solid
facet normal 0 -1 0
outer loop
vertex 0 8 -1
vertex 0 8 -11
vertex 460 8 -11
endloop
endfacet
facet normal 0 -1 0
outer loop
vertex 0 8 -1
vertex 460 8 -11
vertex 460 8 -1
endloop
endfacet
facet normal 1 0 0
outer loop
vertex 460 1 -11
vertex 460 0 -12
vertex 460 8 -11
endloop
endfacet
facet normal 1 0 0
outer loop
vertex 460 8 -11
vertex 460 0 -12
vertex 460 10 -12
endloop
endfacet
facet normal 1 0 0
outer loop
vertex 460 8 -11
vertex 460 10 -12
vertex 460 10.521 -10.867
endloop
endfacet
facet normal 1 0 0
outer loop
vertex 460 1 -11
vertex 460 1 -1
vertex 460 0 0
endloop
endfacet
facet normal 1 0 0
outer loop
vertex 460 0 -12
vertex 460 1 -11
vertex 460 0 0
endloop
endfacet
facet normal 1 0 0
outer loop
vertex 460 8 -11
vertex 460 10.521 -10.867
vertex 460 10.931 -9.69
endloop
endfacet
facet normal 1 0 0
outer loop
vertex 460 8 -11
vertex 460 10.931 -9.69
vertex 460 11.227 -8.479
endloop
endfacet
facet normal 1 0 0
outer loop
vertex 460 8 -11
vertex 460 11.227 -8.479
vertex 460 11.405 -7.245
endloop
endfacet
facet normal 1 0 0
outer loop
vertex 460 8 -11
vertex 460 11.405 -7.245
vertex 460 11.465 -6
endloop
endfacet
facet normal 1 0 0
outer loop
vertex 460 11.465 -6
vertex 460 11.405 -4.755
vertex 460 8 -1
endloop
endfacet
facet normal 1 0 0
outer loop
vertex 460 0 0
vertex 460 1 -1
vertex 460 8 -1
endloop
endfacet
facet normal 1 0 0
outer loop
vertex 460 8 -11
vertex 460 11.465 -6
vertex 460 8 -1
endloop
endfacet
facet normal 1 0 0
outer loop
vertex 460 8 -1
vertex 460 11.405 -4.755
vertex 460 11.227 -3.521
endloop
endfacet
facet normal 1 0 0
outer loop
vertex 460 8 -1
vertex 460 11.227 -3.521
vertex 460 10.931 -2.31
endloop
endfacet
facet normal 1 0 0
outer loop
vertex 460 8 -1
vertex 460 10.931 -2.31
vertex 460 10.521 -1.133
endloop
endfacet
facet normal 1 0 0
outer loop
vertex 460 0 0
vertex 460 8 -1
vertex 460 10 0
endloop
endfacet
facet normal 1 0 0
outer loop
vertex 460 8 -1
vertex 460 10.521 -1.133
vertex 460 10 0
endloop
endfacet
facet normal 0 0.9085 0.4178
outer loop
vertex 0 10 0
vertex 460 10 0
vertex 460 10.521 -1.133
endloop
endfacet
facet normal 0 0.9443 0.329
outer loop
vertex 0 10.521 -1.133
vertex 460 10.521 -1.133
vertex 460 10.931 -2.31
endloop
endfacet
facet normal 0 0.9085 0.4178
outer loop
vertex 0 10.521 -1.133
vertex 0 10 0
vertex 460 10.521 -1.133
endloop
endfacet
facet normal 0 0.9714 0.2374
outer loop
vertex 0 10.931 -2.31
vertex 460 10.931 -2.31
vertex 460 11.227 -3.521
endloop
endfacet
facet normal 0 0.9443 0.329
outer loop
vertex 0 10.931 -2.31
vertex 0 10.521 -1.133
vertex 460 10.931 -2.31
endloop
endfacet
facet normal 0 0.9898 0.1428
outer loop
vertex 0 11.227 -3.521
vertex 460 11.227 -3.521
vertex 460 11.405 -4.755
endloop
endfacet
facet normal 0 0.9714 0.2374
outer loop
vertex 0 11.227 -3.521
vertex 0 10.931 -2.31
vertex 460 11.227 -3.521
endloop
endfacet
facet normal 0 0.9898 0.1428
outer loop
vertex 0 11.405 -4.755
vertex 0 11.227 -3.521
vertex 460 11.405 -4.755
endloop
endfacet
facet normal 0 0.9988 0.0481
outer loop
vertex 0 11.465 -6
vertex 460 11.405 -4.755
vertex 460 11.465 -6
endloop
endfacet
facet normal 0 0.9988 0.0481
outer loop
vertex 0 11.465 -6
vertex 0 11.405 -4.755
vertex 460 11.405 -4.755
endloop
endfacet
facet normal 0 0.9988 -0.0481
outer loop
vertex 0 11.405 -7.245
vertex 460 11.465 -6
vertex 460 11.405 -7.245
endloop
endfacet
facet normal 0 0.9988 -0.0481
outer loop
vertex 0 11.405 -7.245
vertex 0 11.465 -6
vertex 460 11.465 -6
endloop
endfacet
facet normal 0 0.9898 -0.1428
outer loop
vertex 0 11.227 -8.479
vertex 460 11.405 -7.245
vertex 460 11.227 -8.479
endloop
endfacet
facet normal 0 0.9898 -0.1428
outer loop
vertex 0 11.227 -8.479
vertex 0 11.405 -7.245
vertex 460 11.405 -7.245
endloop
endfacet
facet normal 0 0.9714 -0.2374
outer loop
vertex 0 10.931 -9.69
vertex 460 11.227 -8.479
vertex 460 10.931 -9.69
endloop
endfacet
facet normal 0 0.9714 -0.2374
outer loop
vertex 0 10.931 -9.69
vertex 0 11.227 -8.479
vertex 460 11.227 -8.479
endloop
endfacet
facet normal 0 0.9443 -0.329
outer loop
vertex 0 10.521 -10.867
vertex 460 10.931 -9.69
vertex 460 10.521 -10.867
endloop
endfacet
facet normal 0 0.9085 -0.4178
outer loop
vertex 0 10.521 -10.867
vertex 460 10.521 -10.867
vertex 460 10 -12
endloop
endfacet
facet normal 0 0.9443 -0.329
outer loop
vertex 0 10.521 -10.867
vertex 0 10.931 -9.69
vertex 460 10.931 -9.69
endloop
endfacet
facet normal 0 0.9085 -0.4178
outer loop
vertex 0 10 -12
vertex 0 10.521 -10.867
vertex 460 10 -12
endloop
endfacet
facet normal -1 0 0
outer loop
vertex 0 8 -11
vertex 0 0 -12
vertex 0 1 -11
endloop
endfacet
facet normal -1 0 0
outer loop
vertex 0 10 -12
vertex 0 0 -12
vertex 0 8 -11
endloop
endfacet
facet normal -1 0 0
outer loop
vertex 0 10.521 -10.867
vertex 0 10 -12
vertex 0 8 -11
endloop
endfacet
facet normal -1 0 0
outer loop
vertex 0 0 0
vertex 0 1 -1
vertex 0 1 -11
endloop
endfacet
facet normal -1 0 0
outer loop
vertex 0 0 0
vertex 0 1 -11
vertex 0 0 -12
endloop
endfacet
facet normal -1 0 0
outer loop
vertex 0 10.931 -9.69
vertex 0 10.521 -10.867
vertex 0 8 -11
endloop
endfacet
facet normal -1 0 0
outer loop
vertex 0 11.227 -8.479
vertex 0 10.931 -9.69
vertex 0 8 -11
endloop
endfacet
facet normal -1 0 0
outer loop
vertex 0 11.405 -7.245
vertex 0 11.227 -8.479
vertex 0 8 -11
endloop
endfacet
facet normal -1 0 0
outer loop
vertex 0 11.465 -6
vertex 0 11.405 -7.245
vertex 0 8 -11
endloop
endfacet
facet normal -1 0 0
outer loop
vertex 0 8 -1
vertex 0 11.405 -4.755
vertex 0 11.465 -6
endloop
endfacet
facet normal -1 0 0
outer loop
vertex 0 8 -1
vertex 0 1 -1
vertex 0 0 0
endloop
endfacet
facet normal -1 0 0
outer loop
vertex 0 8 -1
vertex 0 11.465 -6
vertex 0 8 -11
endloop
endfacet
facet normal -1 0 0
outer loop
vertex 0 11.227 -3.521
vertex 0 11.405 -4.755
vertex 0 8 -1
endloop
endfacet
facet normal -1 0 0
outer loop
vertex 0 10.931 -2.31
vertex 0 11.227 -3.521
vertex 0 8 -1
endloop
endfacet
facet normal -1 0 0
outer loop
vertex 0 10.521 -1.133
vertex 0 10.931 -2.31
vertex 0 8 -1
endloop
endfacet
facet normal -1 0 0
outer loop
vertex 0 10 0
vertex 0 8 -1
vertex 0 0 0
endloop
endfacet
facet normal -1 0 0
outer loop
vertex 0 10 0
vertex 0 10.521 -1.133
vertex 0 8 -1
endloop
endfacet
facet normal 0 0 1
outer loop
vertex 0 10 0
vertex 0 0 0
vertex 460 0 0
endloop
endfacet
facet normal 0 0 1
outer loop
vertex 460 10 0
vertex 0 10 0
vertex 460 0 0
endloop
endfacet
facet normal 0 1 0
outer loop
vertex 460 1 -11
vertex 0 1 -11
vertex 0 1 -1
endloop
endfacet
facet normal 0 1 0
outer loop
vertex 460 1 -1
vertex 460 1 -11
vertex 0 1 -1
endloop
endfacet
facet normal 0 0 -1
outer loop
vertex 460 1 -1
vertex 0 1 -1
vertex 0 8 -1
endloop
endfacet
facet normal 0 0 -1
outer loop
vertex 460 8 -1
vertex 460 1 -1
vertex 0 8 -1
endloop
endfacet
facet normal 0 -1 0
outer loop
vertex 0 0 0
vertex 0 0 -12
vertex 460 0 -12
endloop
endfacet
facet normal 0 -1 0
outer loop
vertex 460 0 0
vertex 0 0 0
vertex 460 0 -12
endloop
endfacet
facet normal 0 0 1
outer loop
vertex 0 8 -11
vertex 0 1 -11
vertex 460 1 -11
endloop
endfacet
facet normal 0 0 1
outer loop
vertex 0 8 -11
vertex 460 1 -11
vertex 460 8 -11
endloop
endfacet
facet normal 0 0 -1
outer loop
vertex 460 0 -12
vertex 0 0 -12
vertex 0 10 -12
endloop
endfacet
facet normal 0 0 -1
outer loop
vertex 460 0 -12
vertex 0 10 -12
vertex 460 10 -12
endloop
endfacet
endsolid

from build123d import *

# Parameters (mm, degrees)
CROQUIS1_W              = 460
CROQUIS1_H              = 12
SALIENTE_EXTRUIR1_DEPTH = 10
CROQUIS2_W              = 10
CROQUIS2_H              = 7
CORTAR_EXTRUIR1_DEPTH   = 970
SALIENTE_EXTRUIR2_DEPTH = 460


with BuildPart() as part:
    # Croquis1 → Saliente-Extruir1 (new body)
    with BuildSketch(Plane(origin=(0, 0, 0), x_dir=(1, 0, 0), z_dir=(0, 1, 0))):
        with Locations((230, 6)):
            Rectangle(CROQUIS1_W, CROQUIS1_H)
    extrude(amount=SALIENTE_EXTRUIR1_DEPTH)

    # Croquis2 → Cortar-Extruir1 (cut)
    with BuildSketch(Plane.ZY):
        with Locations((-6, 4.5)):
            Rectangle(CROQUIS2_W, CROQUIS2_H)
    extrude(amount=-CORTAR_EXTRUIR1_DEPTH, mode=Mode.SUBTRACT)

    # Croquis3 → Saliente-Extruir2 (add)
    with BuildSketch(Plane.ZY):
        with BuildLine():
            ThreePointArc((0, 10), (-6, 11.465101961), (-12, 10))
            Line((-12, 10), (0, 10))
        make_face()
    extrude(amount=-SALIENTE_EXTRUIR2_DEPTH)


solid = part.part
